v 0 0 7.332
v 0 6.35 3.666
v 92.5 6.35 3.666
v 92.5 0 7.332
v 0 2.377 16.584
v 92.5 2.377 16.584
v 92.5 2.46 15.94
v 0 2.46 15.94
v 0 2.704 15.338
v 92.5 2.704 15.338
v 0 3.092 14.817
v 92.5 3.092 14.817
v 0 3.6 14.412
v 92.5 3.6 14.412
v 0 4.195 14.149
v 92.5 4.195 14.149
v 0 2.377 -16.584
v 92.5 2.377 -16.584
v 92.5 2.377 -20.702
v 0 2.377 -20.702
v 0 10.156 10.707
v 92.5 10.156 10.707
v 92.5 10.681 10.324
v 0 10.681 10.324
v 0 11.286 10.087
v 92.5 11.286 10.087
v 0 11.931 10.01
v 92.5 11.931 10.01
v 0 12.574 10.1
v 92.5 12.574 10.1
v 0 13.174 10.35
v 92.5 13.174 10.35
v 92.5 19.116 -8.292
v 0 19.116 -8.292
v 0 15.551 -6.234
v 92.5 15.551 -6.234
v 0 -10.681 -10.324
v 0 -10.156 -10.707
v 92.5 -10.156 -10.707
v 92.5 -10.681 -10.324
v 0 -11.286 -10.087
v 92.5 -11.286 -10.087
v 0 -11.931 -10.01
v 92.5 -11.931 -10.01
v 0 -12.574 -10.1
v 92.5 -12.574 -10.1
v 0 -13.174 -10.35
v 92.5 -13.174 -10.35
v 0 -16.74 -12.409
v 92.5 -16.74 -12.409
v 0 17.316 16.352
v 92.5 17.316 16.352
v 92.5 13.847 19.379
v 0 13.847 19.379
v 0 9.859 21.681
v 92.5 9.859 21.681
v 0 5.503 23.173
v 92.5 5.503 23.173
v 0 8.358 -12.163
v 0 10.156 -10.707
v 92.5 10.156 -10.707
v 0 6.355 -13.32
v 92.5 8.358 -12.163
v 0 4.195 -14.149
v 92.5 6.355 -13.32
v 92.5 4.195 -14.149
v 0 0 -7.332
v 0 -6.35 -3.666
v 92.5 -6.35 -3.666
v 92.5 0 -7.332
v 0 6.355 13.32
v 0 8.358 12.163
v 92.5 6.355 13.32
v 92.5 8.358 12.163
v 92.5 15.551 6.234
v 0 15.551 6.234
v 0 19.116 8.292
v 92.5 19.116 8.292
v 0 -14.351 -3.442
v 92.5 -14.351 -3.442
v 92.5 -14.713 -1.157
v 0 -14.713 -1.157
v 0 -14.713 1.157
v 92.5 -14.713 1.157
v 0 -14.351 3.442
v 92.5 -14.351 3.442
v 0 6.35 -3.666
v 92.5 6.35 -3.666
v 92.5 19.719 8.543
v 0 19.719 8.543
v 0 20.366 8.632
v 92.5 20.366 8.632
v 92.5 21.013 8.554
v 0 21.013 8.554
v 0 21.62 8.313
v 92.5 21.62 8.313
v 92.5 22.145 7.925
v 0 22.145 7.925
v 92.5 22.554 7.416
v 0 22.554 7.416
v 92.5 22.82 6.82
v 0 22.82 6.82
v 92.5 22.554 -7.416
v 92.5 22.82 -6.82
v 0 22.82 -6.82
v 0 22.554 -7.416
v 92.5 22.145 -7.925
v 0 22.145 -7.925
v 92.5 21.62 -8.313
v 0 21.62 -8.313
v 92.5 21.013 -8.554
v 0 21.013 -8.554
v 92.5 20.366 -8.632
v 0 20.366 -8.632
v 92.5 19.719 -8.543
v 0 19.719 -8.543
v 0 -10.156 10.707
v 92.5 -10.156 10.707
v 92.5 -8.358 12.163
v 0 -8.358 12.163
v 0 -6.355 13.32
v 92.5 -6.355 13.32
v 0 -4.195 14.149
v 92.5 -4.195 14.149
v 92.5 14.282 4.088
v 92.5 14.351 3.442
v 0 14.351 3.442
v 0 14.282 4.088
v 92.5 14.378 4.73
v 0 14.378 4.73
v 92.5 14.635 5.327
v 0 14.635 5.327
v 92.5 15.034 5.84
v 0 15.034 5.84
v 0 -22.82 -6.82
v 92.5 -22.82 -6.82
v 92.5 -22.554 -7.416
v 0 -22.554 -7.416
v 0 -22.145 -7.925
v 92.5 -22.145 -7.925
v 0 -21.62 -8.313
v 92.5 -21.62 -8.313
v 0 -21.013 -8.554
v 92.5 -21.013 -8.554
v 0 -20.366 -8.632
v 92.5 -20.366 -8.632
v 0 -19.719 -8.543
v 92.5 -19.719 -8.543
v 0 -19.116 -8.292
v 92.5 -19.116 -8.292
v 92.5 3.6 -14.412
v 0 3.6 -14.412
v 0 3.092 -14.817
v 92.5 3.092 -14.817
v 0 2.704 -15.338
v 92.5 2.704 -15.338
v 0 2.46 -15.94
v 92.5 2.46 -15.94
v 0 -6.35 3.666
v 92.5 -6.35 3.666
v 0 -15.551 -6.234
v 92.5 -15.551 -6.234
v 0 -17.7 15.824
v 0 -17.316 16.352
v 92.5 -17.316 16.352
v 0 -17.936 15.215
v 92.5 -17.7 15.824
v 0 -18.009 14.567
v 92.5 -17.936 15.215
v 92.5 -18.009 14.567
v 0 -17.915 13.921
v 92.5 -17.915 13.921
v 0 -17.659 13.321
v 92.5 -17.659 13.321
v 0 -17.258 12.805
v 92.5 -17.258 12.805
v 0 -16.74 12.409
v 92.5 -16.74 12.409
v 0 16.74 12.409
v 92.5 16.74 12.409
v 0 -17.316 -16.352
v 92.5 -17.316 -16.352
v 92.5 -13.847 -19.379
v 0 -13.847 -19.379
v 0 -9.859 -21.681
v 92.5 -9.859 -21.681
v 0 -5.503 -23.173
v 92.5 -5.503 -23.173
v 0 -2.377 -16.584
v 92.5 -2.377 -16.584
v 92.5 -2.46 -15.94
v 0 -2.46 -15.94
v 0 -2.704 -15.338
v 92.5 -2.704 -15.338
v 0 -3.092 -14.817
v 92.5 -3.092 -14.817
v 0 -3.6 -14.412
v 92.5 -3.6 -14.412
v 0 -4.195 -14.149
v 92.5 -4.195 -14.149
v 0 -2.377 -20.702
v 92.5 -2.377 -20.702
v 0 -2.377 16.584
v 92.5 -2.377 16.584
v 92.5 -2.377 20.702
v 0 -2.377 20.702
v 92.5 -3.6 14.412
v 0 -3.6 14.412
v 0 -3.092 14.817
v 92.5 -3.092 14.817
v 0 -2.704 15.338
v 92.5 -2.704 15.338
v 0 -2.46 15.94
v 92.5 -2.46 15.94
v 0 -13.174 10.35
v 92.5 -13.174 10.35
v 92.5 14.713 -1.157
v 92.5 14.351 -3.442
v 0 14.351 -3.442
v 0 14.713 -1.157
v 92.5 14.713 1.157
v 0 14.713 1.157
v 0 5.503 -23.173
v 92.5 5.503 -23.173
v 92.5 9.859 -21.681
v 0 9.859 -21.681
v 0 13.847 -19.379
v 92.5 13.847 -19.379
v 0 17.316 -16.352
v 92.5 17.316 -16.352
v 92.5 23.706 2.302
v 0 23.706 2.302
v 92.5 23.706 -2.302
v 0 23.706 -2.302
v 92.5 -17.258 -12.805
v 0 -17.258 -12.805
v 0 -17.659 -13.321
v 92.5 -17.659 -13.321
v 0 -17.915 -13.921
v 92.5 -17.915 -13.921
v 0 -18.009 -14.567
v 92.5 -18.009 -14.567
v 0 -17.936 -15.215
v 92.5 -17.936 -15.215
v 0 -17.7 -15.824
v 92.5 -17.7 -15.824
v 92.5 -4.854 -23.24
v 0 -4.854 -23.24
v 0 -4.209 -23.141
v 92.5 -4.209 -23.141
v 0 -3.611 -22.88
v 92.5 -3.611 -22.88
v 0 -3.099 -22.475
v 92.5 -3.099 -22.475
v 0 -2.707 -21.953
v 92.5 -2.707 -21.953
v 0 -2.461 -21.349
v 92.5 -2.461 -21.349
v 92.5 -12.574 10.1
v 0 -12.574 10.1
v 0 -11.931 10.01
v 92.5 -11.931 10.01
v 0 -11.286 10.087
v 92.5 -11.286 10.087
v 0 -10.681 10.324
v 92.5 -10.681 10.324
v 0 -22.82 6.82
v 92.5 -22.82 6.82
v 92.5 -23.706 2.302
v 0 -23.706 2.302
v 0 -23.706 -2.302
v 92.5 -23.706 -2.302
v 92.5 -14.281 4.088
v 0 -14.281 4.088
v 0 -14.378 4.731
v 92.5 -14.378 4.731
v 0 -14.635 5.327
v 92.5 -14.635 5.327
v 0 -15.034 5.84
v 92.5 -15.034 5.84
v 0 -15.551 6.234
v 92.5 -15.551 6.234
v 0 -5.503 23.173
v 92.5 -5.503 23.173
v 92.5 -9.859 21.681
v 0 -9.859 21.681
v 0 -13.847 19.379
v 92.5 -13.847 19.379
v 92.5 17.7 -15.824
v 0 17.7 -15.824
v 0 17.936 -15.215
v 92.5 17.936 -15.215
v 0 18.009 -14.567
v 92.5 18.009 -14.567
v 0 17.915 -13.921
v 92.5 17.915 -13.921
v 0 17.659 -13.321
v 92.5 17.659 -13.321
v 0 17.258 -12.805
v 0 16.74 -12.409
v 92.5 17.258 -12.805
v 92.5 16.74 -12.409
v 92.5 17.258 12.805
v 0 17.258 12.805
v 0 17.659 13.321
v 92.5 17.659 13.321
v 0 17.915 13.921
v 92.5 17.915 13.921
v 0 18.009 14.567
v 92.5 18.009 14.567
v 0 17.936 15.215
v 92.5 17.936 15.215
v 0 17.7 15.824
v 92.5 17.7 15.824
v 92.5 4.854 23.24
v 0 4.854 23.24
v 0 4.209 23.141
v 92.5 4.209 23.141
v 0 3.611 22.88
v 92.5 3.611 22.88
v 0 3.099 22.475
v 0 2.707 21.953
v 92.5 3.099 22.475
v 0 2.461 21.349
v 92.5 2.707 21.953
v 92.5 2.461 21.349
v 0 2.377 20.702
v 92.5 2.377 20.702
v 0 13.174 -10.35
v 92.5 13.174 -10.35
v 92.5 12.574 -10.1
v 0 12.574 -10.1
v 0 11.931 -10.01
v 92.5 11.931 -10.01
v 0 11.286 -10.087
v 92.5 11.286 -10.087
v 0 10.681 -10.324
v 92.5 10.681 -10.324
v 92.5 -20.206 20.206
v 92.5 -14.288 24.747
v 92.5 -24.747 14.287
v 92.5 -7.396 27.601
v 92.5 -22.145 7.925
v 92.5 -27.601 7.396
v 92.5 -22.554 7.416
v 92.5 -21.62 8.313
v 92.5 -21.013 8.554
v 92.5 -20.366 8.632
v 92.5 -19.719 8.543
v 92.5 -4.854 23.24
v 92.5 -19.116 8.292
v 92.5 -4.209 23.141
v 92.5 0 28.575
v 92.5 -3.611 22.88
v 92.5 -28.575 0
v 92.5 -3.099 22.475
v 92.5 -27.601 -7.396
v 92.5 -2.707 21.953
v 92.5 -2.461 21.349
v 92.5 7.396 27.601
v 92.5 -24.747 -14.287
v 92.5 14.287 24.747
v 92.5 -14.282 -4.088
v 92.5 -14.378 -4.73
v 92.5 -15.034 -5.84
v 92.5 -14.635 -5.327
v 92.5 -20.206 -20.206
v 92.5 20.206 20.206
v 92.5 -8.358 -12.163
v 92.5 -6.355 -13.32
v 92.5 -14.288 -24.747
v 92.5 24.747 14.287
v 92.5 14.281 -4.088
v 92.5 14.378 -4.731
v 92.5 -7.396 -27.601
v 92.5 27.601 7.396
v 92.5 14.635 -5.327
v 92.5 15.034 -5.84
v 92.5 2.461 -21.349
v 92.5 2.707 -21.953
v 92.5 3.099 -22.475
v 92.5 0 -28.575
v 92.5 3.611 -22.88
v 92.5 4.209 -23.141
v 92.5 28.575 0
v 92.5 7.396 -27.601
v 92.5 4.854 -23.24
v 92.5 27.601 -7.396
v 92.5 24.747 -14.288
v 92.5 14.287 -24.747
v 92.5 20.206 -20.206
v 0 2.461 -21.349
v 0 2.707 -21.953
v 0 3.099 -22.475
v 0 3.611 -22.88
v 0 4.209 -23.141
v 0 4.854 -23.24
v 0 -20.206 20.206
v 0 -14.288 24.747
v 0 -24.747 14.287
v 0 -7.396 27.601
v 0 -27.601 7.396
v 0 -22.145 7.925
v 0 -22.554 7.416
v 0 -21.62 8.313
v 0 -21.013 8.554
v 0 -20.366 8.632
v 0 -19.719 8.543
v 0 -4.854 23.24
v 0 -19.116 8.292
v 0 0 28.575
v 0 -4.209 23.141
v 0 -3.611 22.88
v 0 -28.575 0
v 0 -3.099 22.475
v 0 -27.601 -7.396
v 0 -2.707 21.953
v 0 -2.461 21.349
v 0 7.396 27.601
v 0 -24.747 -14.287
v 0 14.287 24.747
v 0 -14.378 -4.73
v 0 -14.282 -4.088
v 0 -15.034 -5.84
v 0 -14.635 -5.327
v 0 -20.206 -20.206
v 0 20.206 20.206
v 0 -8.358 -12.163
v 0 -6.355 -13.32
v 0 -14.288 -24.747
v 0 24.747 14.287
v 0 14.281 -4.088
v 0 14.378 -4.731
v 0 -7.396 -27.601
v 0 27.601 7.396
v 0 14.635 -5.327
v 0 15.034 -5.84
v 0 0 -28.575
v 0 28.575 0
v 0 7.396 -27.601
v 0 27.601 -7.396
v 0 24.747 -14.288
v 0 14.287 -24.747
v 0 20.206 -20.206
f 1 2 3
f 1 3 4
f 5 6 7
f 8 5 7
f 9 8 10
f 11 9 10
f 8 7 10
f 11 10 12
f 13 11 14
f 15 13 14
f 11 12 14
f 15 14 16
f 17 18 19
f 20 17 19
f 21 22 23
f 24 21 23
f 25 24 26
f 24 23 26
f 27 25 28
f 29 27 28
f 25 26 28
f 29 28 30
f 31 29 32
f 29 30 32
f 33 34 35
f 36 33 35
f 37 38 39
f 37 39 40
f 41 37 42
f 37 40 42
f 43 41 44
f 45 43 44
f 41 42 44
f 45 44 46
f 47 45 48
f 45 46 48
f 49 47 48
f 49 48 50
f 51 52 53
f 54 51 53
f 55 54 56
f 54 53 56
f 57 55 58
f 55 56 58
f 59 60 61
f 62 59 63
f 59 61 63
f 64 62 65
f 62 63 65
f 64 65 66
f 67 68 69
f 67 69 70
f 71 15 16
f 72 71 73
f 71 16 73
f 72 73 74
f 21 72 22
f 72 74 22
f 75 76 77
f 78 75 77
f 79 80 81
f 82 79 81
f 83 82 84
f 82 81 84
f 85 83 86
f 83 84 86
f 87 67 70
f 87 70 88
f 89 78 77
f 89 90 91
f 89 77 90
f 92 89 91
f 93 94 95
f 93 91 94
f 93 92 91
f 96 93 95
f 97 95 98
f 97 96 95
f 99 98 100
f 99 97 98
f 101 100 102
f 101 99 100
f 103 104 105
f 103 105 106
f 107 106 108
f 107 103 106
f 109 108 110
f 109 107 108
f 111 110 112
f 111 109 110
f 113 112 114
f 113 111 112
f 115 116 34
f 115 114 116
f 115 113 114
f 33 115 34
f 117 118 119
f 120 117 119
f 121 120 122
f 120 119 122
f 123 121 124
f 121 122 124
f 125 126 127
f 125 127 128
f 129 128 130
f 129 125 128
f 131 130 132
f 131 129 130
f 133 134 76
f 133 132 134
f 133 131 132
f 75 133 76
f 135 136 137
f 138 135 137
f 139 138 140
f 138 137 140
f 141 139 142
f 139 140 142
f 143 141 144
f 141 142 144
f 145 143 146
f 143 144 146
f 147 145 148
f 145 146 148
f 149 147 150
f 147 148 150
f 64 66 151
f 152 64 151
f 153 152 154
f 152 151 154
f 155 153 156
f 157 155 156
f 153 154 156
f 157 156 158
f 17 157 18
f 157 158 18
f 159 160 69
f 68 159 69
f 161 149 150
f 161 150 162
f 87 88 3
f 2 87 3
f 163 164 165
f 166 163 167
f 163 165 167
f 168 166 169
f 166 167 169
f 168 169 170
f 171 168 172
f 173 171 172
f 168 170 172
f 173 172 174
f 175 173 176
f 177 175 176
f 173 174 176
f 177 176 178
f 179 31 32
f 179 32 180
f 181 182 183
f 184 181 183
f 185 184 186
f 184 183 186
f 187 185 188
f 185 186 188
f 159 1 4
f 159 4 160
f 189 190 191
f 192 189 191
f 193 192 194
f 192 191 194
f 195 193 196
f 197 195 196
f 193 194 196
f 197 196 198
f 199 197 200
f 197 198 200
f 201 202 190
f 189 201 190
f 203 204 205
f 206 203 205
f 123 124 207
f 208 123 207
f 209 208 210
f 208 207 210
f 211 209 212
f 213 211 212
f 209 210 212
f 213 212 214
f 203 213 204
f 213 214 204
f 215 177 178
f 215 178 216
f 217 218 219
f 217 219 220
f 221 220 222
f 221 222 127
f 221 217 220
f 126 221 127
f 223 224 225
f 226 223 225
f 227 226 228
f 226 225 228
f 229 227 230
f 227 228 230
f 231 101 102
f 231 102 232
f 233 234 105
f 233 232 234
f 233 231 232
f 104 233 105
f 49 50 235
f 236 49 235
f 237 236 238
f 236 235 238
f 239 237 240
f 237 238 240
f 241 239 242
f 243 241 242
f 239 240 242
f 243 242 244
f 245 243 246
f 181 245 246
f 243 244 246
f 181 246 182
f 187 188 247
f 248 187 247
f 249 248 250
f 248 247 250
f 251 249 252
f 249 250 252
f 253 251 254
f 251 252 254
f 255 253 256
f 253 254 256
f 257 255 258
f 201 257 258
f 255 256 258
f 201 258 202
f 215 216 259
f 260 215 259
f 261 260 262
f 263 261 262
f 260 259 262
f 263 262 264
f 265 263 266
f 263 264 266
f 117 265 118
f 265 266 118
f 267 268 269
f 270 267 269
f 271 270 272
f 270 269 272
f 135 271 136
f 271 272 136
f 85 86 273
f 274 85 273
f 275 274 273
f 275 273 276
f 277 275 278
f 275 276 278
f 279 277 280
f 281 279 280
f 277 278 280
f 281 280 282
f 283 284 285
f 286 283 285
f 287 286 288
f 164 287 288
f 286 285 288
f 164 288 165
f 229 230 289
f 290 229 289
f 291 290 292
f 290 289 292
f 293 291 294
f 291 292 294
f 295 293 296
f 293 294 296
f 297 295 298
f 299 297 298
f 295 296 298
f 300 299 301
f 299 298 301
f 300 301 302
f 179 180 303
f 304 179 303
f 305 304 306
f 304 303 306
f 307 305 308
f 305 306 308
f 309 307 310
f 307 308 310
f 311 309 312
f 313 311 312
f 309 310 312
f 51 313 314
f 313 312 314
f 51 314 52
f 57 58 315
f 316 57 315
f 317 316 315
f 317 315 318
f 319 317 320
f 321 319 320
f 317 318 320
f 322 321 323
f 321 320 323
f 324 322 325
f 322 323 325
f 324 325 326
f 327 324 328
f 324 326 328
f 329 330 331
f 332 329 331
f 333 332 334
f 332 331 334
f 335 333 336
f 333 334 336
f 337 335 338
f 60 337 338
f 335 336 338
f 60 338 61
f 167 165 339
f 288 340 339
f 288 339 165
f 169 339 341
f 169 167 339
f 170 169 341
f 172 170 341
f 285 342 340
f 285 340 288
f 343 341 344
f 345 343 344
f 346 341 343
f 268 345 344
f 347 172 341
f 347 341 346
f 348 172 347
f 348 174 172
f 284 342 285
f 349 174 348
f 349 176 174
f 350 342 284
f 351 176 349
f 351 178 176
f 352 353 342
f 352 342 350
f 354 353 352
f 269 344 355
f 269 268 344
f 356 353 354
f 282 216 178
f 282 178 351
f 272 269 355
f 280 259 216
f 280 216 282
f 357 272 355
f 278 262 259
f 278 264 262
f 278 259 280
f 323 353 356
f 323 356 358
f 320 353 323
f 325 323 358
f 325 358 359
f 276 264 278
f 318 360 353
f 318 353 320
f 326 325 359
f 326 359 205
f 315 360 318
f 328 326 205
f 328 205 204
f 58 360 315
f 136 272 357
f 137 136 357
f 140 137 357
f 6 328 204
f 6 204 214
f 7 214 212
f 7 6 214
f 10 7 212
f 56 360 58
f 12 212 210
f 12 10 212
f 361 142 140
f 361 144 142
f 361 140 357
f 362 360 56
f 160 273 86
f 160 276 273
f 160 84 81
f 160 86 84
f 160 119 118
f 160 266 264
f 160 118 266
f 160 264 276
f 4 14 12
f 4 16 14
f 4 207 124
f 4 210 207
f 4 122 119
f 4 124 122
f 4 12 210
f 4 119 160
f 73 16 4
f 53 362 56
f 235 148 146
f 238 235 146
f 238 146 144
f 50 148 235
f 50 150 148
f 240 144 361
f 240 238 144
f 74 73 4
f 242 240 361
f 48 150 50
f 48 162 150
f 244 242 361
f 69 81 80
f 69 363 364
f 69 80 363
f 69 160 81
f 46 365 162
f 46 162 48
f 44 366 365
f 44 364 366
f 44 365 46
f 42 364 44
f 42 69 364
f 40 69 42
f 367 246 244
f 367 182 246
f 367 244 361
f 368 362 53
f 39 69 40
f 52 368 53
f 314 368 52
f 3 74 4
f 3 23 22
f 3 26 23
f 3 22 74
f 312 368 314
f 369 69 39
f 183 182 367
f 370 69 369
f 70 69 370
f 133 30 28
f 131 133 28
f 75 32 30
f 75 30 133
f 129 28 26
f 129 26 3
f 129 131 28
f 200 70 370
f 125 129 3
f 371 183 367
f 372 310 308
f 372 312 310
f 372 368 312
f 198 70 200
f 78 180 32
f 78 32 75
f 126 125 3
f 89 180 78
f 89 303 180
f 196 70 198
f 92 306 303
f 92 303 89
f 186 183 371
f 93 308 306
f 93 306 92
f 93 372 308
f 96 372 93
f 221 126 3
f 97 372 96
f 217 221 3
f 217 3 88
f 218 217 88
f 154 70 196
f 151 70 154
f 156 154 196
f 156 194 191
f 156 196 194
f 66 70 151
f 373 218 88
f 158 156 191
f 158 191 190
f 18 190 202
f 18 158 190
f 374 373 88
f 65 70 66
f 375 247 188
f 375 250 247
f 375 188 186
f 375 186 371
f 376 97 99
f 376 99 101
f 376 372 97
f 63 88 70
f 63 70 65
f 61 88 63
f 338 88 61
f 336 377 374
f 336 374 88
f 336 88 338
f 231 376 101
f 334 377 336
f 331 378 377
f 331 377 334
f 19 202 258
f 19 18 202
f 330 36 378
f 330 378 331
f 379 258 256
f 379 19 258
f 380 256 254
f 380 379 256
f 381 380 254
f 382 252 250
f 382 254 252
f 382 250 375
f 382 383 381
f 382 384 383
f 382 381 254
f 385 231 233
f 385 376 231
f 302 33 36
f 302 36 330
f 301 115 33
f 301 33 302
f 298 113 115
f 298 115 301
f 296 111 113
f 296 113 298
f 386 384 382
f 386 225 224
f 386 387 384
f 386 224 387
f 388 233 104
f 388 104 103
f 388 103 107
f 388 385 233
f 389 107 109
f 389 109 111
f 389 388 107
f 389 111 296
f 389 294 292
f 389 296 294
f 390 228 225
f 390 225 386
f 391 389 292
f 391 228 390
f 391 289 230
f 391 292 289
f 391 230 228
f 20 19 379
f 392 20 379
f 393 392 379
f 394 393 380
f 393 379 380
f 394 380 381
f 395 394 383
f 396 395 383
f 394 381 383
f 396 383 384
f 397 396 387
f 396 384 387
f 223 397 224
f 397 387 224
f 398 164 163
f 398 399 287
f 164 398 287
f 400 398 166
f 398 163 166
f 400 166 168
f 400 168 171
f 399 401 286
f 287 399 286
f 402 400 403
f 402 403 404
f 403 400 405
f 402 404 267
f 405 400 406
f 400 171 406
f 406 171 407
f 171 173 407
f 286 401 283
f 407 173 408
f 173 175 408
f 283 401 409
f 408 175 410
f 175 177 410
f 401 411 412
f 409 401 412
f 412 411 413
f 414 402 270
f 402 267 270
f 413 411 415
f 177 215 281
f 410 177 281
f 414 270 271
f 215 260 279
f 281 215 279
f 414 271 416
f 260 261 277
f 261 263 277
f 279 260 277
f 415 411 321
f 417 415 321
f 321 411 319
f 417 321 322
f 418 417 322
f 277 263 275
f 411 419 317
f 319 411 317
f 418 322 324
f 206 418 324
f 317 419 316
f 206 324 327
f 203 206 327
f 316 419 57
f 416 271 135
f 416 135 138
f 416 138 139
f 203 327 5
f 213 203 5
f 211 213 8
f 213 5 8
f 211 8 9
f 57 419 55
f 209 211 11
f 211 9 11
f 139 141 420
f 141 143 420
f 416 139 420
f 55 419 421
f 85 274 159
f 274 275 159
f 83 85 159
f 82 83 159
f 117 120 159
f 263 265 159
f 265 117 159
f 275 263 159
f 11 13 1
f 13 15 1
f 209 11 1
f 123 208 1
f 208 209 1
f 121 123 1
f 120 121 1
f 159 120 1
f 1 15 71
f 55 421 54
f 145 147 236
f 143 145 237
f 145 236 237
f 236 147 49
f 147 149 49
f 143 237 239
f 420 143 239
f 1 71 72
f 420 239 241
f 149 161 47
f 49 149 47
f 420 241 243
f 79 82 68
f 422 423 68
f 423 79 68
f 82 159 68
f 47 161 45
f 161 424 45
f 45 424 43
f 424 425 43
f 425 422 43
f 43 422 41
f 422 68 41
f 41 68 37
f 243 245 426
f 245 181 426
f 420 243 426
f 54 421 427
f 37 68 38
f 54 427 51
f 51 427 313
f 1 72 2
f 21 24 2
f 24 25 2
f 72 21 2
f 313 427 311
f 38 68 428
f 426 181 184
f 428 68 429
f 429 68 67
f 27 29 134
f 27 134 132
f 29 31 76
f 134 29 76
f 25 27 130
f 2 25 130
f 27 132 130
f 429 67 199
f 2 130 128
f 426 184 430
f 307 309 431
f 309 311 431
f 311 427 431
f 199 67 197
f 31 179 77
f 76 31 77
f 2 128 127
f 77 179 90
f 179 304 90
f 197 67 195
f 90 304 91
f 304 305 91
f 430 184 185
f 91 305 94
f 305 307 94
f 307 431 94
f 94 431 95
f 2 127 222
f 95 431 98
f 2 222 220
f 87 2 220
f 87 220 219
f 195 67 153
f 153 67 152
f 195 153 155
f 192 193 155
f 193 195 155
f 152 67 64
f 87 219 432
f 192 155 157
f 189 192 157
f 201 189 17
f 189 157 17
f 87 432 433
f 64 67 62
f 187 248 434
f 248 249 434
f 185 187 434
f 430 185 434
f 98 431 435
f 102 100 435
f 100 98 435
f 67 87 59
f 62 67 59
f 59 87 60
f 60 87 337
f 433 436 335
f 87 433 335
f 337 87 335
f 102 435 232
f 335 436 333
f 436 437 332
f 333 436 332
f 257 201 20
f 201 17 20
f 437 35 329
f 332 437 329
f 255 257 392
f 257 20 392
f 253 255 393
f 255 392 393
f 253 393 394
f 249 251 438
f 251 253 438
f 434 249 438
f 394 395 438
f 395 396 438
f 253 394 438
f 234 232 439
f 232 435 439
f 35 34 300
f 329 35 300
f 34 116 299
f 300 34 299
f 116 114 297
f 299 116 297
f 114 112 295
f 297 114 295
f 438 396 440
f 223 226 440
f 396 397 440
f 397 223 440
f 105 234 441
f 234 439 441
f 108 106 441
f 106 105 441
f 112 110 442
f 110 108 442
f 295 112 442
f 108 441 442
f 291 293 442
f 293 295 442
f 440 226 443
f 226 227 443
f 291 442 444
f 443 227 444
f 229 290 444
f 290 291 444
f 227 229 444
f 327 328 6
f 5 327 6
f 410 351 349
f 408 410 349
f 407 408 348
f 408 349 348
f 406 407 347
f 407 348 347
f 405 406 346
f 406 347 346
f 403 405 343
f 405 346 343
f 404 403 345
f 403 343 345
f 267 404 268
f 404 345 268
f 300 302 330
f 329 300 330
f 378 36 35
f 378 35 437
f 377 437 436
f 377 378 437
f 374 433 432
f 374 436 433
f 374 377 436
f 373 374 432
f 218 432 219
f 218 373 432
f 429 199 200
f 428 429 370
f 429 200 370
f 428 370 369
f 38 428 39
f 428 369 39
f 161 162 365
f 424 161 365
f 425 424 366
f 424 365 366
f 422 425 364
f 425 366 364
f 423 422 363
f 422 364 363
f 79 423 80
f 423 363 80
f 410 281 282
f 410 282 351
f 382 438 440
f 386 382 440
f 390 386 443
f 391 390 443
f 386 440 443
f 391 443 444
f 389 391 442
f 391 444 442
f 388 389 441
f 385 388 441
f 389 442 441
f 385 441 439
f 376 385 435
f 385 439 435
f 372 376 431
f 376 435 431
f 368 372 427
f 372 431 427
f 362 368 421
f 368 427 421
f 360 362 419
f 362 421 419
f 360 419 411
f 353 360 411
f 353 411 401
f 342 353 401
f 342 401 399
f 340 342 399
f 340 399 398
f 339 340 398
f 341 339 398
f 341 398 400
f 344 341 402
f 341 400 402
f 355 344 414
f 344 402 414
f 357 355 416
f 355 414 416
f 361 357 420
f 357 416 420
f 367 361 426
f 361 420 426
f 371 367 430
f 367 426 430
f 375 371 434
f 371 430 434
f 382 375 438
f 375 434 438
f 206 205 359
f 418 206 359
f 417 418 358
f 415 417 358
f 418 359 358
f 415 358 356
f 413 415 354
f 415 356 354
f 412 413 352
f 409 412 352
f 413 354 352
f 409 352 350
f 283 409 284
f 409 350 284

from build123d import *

# Parameters (mm, degrees)
CROQUIS1_R              = 28.575
SALIENTE_EXTRUIR1_DEPTH = 92.5
CORTAR_EXTRUIR1_DEPTH   = 101.942118315


with BuildPart() as part:
    # Croquis1 → Saliente-Extruir1 (new body)
    with BuildSketch(Plane(origin=(0, 0, 0), x_dir=(0, 0, -1), z_dir=(1, 0, 0))):
        Circle(CROQUIS1_R)
        Polygon((7.332348419, 0), (3.666174209, 6.35), (-3.666174209, 6.35), (-7.332348419, 0), (-3.666174209, -6.35), (3.666174209, -6.35), align=None, mode=Mode.SUBTRACT)
    extrude(amount=SALIENTE_EXTRUIR1_DEPTH)

    # Croquis2 → Cortar-Extruir1 (cut, through all)
    with BuildSketch(Plane(origin=(92.5, 0, 0), x_dir=(0, 0, -1), z_dir=(1, 0, 0))):
        with BuildLine():
            Line((-6.233796171, 15.550729765), (-8.292494443, 19.11649977))
            ThreePointArc((-8.292494443, 19.11649977), (-8.452873942, 21.324398032), (-6.820383997, 22.8195612))
            ThreePointArc((-6.820383997, 22.8195612), (0, 23.817682129), (6.820383997, 22.8195612))
            ThreePointArc((6.820383997, 22.8195612), (8.452873942, 21.324398032), (8.292494443, 19.11649977))
            Line((8.292494443, 19.11649977), (6.233796171, 15.550729765))
            ThreePointArc((6.233796171, 15.550729765), (5.037217596, 14.487169273), (3.442097, 14.350965426))
            ThreePointArc((3.442097, 14.350965426), (0, 14.758215751), (-3.442097, 14.350965426))
            ThreePointArc((-3.442097, 14.350965426), (-5.037136467, 14.487358051), (-6.233796171, 15.550729765))
        make_face()
        with BuildLine():
            Line((16.584225127, 2.376739002), (20.701621672, 2.376739002))
            ThreePointArc((20.701621672, 2.376739002), (22.693907405, 3.341795413), (23.172511718, 5.50315476))
            ThreePointArc((23.172511718, 5.50315476), (20.6267178, 11.90884103), (16.352127722, 17.31640637))
            ThreePointArc((16.352127722, 17.31640637), (14.241033463, 17.98260255), (12.409127229, 16.739760699))
            Line((12.409127229, 16.739760699), (10.350428956, 13.173990694))
            ThreePointArc((10.350428956, 13.173990694), (10.02785189, 11.605967133), (10.707252145, 10.156426122))
            ThreePointArc((10.707252145, 10.156426122), (12.780989772, 7.37910784), (14.149349145, 4.194539234))
            ThreePointArc((14.149349145, 4.194539234), (15.064865435, 2.881226199), (16.584225127, 2.376739002))
        make_face()
        with BuildLine():
            Line((10.350428935, -13.173990796), (12.409127207, -16.739760801))
            ThreePointArc((12.409127207, -16.739760801), (14.241033442, -17.982602652), (16.3521277, -17.316406472))
            ThreePointArc((16.3521277, -17.316406472), (20.626717779, -11.908841132), (23.172511697, -5.503154863))
            ThreePointArc((23.172511697, -5.503154863), (22.693907383, -3.341795515), (20.70162165, -2.376739104))
            Line((20.70162165, -2.376739104), (16.584225106, -2.376739104))
            ThreePointArc((16.584225106, -2.376739104), (15.064988336, -2.881390951), (14.149349124, -4.194539336))
            ThreePointArc((14.149349124, -4.194539336), (12.780989751, -7.379107943), (10.707252124, -10.156426225))
            ThreePointArc((10.707252124, -10.156426225), (10.027647818, -11.605943107), (10.350428935, -13.173990796))
        make_face()
        with BuildLine():
            Line((-6.233796214, -15.550729831), (-8.292494486, -19.116499836))
            ThreePointArc((-8.292494486, -19.116499836), (-8.452873985, -21.324398098), (-6.82038404, -22.819561265))
            ThreePointArc((-6.82038404, -22.819561265), (-4.3e-08, -23.817682194), (6.820383954, -22.819561265))
            ThreePointArc((6.820383954, -22.819561265), (8.452873899, -21.324398098), (8.2924944, -19.116499836))
            Line((8.2924944, -19.116499836), (6.233796128, -15.550729831))
            ThreePointArc((6.233796128, -15.550729831), (5.037136424, -14.487358117), (3.442096957, -14.350965491))
            ThreePointArc((3.442096957, -14.350965491), (-4.3e-08, -14.758215816), (-3.442097043, -14.350965491))
            ThreePointArc((-3.442097043, -14.350965491), (-5.037217639, -14.487169339), (-6.233796214, -15.550729831))
        make_face()
        with BuildLine():
            Line((-16.58422517, -2.376739067), (-20.701621714, -2.376739067))
            ThreePointArc((-20.701621714, -2.376739067), (-22.693907448, -3.341795478), (-23.172511761, -5.503154826))
            ThreePointArc((-23.172511761, -5.503154826), (-20.626717843, -11.908841095), (-16.352127764, -17.316406435))
            ThreePointArc((-16.352127764, -17.316406435), (-14.241033506, -17.982602615), (-12.409127271, -16.739760764))
            Line((-12.409127271, -16.739760764), (-10.350428999, -13.173990759))
            ThreePointArc((-10.350428999, -13.173990759), (-10.027851933, -11.605967199), (-10.707252188, -10.156426188))
            ThreePointArc((-10.707252188, -10.156426188), (-12.780989815, -7.379107906), (-14.149349188, -4.194539299))
            ThreePointArc((-14.149349188, -4.194539299), (-15.064865478, -2.881226264), (-16.58422517, -2.376739067))
        make_face()
        with BuildLine():
            Line((-10.350428978, 13.173990731), (-12.40912725, 16.739760736))
            ThreePointArc((-12.40912725, 16.739760736), (-14.241033484, 17.982602587), (-16.352127743, 17.316406407))
            ThreePointArc((-16.352127743, 17.316406407), (-20.626717822, 11.908841067), (-23.17251174, 5.503154797))
            ThreePointArc((-23.17251174, 5.503154797), (-22.693907426, 3.34179545), (-20.701621693, 2.376739039))
            Line((-20.701621693, 2.376739039), (-16.584225148, 2.376739039))
            ThreePointArc((-16.584225148, 2.376739039), (-15.064988378, 2.881390885), (-14.149349166, 4.194539271))
            ThreePointArc((-14.149349166, 4.194539271), (-12.780989794, 7.379107878), (-10.707252167, 10.156426159))
            ThreePointArc((-10.707252167, 10.156426159), (-10.027647861, 11.605943042), (-10.350428978, 13.173990731))
        make_face()
    extrude(amount=-CORTAR_EXTRUIR1_DEPTH, mode=Mode.SUBTRACT)


solid = part.part
